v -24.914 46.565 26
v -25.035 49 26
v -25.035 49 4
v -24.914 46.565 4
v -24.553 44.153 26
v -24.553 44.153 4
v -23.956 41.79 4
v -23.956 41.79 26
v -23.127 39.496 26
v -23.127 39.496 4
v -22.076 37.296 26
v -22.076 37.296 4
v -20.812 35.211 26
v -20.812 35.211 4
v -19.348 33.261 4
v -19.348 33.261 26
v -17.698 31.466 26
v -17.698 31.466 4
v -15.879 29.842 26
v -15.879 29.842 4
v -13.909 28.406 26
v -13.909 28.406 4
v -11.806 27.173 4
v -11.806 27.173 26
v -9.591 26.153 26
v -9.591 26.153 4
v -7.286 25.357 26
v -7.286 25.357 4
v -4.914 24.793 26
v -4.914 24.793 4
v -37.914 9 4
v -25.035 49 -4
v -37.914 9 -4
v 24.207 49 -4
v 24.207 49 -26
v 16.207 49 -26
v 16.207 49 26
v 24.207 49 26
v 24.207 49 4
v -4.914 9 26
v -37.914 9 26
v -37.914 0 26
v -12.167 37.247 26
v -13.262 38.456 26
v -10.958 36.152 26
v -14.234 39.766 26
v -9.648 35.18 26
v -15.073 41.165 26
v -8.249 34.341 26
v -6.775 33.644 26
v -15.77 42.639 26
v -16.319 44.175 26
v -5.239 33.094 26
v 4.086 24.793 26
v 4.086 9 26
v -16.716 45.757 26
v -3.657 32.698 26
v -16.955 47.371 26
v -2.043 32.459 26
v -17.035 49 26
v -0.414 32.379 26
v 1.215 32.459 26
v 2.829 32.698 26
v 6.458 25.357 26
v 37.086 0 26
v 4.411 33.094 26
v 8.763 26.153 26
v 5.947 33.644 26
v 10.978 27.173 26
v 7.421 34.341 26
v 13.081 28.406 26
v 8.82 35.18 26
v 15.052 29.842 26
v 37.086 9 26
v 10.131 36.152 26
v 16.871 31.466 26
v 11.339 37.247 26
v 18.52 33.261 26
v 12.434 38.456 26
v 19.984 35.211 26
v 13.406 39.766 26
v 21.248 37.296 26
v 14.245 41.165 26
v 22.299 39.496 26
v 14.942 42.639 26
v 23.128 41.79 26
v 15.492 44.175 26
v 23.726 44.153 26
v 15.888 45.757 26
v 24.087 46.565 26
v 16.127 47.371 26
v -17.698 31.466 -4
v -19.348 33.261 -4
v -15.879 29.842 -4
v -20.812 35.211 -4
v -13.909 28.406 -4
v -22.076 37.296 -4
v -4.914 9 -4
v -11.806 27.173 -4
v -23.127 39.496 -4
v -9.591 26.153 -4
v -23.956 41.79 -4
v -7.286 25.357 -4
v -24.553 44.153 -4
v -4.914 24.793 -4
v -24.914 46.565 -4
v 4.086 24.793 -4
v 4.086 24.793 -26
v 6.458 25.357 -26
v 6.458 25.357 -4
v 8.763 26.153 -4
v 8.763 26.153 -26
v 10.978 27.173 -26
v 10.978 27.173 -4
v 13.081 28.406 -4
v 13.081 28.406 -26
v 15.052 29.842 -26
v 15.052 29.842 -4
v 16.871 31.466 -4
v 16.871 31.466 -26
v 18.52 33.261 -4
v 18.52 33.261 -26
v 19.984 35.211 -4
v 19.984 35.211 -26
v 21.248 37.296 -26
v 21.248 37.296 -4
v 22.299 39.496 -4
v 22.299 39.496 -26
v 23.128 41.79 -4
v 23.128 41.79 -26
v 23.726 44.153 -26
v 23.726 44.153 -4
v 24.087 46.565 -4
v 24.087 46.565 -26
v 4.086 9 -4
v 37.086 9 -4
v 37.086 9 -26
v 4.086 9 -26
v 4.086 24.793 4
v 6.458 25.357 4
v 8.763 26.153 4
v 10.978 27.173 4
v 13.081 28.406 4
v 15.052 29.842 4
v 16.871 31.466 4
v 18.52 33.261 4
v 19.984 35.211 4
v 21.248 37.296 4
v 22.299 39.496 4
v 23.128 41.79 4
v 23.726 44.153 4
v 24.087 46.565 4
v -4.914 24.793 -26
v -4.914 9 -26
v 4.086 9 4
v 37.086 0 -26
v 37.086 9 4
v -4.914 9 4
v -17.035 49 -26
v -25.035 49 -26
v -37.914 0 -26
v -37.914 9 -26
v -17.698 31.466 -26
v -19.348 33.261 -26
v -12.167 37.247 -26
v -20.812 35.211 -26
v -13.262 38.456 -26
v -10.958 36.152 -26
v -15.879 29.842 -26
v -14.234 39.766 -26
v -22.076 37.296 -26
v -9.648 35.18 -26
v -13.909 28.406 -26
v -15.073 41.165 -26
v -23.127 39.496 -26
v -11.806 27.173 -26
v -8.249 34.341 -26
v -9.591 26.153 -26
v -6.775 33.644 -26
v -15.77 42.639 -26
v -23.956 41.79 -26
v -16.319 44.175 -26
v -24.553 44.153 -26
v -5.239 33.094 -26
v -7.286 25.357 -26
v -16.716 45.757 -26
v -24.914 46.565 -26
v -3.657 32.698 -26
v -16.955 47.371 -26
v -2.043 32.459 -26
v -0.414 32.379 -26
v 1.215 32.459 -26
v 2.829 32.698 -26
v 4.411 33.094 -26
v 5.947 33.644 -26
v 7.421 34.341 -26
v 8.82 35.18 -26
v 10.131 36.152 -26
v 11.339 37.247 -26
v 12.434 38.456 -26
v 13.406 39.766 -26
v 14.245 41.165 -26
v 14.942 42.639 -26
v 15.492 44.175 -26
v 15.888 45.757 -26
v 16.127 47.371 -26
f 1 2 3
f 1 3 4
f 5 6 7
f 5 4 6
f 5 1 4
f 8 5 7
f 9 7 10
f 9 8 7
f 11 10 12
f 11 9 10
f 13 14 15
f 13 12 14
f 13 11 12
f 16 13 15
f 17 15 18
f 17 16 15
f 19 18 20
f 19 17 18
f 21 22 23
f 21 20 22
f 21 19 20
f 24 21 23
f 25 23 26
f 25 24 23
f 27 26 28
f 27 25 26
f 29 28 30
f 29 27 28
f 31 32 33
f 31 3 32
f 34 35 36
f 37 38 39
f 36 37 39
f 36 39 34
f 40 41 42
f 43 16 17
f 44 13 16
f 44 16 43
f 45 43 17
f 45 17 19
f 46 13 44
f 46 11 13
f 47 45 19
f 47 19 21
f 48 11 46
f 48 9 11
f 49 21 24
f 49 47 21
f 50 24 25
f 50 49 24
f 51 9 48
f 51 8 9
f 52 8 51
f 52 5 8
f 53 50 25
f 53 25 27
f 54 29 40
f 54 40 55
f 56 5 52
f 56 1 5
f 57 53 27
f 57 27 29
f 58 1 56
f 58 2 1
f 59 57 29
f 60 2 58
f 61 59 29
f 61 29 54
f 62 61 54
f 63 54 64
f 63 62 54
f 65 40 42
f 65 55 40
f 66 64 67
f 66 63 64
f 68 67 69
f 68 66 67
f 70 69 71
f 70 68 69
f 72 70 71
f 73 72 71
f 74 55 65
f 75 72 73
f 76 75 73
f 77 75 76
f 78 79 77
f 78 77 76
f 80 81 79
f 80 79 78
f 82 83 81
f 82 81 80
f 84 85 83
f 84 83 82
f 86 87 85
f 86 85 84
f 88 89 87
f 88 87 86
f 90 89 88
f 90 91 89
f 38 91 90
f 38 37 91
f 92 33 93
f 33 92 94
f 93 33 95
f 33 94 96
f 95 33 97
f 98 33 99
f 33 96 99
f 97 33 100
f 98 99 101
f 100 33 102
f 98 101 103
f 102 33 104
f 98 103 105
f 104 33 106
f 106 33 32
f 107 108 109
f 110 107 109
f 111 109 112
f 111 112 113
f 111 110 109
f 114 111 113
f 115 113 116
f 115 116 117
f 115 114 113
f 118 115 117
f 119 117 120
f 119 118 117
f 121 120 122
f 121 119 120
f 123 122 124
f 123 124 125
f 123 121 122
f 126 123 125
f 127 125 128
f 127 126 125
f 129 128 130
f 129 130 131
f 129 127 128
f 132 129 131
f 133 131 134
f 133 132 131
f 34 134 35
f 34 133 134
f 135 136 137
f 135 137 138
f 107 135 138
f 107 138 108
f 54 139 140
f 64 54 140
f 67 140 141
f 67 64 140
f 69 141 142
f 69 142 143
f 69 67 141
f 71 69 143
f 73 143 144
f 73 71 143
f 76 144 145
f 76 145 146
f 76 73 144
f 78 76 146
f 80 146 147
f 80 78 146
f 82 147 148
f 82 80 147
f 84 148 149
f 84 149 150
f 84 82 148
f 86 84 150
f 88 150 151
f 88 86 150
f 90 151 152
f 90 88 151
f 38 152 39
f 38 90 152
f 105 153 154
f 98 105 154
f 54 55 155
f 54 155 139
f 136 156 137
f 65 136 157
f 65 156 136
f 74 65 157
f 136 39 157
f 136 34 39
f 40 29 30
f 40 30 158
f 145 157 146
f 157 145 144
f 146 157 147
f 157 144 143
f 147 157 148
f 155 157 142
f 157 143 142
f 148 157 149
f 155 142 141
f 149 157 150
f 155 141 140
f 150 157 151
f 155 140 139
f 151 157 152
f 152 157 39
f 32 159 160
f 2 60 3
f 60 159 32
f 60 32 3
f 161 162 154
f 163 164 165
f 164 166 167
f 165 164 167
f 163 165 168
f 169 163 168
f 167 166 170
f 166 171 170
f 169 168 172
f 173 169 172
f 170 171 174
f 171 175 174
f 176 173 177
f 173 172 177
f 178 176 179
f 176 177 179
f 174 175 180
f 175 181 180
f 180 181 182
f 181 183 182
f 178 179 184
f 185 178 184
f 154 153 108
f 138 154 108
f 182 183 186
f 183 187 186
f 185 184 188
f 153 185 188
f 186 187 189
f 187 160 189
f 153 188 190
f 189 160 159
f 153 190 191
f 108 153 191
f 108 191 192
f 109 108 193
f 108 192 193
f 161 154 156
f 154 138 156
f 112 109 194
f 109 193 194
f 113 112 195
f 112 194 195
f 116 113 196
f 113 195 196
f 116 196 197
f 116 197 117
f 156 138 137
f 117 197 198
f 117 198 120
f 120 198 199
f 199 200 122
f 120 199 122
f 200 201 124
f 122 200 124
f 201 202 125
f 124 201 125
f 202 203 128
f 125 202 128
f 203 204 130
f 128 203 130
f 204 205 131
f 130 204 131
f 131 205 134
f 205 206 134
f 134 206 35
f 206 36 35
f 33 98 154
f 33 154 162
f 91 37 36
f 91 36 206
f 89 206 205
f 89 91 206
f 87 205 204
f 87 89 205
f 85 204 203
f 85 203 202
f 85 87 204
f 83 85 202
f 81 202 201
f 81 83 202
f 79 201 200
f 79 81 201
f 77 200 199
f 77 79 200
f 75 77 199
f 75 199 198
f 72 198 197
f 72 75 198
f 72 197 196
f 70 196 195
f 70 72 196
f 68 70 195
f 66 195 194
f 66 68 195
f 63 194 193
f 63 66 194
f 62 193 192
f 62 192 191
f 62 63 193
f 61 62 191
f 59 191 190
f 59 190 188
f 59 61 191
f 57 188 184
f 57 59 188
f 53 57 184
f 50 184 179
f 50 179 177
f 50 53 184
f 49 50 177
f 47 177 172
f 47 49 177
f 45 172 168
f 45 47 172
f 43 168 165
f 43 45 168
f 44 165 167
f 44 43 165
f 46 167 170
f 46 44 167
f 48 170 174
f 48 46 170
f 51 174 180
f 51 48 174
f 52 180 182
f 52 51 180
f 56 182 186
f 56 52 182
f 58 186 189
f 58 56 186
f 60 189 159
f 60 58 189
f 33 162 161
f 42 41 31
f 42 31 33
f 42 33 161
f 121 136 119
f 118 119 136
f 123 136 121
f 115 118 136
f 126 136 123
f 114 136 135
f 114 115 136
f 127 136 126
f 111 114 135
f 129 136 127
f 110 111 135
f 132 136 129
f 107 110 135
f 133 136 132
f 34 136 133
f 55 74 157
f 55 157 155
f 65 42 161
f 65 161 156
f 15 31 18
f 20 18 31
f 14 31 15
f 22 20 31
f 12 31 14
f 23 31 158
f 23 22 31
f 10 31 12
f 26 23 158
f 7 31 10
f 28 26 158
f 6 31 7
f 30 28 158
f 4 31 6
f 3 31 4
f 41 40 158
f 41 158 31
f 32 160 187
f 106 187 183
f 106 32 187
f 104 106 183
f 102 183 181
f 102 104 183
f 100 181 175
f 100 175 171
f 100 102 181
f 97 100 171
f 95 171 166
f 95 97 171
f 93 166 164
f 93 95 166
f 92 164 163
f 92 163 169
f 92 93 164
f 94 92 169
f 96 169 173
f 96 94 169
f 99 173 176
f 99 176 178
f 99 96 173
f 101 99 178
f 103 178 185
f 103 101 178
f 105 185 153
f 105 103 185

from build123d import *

# Parameters (mm, degrees)
BOSS_EXTRUDE1_DEPTH = 52
BOSS_EXTRUDE2_DEPTH = 4


with BuildPart() as part:
    # Sketch1 → Boss-Extrude1 (new body)
    with BuildSketch(Plane.XY):
        with BuildLine():
            Line((-37.913907285, 9), (-37.913907285, 0))
            Line((-37.913907285, 0), (37.086092715, 0))
            Line((37.086092715, 0), (37.086092715, 9))
            Line((37.086092715, 9), (4.086092715, 9))
            Line((4.086092715, 9), (4.086092715, 24.793471725))
            ThreePointArc((4.086092715, 24.793471725), (18.520210619, 33.261347251), (24.207343925, 49))
            Line((24.207343925, 49), (16.207343925, 49))
            ThreePointArc((16.207343925, 49), (-0.413907285, 32.37874879), (-17.035158495, 49))
            Line((-17.035158495, 49), (-25.035158495, 49))
            ThreePointArc((-25.035158495, 49), (-19.348025189, 33.261347251), (-4.913907285, 24.793471725))
            Line((-4.913907285, 24.793471725), (-4.913907285, 9))
            Line((-4.913907285, 9), (-37.913907285, 9))
        make_face()
    extrude(amount=-BOSS_EXTRUDE1_DEPTH)


with BuildPart() as part_1:
    # Body-Move/Copy1: moved
    add(part.part.moved(Location((0, 0, 26))))

    # Sketch3 → Boss-Extrude2 (add, symmetric)
    with BuildSketch(Plane.XY):
        with BuildLine():
            Line((24.207343925, 49), (37.086092715, 9))
            Line((37.086092715, 9), (4.086092715, 9))
            Line((4.086092715, 9), (4.086092715, 24.793471725))
            ThreePointArc((4.086092715, 24.793471725), (18.520210619, 33.261347251), (24.207343925, 49))
        make_face()
        with BuildLine():
            Line((-25.035158495, 49), (-37.913907285, 9))
            Line((-37.913907285, 9), (-4.913907285, 9))
            Line((-4.913907285, 9), (-4.913907285, 24.793471725))
            ThreePointArc((-4.913907285, 24.793471725), (-19.348025189, 33.261347251), (-25.035158495, 49))
        make_face()
    extrude(amount=BOSS_EXTRUDE2_DEPTH, both=True)


solid = part_1.part
